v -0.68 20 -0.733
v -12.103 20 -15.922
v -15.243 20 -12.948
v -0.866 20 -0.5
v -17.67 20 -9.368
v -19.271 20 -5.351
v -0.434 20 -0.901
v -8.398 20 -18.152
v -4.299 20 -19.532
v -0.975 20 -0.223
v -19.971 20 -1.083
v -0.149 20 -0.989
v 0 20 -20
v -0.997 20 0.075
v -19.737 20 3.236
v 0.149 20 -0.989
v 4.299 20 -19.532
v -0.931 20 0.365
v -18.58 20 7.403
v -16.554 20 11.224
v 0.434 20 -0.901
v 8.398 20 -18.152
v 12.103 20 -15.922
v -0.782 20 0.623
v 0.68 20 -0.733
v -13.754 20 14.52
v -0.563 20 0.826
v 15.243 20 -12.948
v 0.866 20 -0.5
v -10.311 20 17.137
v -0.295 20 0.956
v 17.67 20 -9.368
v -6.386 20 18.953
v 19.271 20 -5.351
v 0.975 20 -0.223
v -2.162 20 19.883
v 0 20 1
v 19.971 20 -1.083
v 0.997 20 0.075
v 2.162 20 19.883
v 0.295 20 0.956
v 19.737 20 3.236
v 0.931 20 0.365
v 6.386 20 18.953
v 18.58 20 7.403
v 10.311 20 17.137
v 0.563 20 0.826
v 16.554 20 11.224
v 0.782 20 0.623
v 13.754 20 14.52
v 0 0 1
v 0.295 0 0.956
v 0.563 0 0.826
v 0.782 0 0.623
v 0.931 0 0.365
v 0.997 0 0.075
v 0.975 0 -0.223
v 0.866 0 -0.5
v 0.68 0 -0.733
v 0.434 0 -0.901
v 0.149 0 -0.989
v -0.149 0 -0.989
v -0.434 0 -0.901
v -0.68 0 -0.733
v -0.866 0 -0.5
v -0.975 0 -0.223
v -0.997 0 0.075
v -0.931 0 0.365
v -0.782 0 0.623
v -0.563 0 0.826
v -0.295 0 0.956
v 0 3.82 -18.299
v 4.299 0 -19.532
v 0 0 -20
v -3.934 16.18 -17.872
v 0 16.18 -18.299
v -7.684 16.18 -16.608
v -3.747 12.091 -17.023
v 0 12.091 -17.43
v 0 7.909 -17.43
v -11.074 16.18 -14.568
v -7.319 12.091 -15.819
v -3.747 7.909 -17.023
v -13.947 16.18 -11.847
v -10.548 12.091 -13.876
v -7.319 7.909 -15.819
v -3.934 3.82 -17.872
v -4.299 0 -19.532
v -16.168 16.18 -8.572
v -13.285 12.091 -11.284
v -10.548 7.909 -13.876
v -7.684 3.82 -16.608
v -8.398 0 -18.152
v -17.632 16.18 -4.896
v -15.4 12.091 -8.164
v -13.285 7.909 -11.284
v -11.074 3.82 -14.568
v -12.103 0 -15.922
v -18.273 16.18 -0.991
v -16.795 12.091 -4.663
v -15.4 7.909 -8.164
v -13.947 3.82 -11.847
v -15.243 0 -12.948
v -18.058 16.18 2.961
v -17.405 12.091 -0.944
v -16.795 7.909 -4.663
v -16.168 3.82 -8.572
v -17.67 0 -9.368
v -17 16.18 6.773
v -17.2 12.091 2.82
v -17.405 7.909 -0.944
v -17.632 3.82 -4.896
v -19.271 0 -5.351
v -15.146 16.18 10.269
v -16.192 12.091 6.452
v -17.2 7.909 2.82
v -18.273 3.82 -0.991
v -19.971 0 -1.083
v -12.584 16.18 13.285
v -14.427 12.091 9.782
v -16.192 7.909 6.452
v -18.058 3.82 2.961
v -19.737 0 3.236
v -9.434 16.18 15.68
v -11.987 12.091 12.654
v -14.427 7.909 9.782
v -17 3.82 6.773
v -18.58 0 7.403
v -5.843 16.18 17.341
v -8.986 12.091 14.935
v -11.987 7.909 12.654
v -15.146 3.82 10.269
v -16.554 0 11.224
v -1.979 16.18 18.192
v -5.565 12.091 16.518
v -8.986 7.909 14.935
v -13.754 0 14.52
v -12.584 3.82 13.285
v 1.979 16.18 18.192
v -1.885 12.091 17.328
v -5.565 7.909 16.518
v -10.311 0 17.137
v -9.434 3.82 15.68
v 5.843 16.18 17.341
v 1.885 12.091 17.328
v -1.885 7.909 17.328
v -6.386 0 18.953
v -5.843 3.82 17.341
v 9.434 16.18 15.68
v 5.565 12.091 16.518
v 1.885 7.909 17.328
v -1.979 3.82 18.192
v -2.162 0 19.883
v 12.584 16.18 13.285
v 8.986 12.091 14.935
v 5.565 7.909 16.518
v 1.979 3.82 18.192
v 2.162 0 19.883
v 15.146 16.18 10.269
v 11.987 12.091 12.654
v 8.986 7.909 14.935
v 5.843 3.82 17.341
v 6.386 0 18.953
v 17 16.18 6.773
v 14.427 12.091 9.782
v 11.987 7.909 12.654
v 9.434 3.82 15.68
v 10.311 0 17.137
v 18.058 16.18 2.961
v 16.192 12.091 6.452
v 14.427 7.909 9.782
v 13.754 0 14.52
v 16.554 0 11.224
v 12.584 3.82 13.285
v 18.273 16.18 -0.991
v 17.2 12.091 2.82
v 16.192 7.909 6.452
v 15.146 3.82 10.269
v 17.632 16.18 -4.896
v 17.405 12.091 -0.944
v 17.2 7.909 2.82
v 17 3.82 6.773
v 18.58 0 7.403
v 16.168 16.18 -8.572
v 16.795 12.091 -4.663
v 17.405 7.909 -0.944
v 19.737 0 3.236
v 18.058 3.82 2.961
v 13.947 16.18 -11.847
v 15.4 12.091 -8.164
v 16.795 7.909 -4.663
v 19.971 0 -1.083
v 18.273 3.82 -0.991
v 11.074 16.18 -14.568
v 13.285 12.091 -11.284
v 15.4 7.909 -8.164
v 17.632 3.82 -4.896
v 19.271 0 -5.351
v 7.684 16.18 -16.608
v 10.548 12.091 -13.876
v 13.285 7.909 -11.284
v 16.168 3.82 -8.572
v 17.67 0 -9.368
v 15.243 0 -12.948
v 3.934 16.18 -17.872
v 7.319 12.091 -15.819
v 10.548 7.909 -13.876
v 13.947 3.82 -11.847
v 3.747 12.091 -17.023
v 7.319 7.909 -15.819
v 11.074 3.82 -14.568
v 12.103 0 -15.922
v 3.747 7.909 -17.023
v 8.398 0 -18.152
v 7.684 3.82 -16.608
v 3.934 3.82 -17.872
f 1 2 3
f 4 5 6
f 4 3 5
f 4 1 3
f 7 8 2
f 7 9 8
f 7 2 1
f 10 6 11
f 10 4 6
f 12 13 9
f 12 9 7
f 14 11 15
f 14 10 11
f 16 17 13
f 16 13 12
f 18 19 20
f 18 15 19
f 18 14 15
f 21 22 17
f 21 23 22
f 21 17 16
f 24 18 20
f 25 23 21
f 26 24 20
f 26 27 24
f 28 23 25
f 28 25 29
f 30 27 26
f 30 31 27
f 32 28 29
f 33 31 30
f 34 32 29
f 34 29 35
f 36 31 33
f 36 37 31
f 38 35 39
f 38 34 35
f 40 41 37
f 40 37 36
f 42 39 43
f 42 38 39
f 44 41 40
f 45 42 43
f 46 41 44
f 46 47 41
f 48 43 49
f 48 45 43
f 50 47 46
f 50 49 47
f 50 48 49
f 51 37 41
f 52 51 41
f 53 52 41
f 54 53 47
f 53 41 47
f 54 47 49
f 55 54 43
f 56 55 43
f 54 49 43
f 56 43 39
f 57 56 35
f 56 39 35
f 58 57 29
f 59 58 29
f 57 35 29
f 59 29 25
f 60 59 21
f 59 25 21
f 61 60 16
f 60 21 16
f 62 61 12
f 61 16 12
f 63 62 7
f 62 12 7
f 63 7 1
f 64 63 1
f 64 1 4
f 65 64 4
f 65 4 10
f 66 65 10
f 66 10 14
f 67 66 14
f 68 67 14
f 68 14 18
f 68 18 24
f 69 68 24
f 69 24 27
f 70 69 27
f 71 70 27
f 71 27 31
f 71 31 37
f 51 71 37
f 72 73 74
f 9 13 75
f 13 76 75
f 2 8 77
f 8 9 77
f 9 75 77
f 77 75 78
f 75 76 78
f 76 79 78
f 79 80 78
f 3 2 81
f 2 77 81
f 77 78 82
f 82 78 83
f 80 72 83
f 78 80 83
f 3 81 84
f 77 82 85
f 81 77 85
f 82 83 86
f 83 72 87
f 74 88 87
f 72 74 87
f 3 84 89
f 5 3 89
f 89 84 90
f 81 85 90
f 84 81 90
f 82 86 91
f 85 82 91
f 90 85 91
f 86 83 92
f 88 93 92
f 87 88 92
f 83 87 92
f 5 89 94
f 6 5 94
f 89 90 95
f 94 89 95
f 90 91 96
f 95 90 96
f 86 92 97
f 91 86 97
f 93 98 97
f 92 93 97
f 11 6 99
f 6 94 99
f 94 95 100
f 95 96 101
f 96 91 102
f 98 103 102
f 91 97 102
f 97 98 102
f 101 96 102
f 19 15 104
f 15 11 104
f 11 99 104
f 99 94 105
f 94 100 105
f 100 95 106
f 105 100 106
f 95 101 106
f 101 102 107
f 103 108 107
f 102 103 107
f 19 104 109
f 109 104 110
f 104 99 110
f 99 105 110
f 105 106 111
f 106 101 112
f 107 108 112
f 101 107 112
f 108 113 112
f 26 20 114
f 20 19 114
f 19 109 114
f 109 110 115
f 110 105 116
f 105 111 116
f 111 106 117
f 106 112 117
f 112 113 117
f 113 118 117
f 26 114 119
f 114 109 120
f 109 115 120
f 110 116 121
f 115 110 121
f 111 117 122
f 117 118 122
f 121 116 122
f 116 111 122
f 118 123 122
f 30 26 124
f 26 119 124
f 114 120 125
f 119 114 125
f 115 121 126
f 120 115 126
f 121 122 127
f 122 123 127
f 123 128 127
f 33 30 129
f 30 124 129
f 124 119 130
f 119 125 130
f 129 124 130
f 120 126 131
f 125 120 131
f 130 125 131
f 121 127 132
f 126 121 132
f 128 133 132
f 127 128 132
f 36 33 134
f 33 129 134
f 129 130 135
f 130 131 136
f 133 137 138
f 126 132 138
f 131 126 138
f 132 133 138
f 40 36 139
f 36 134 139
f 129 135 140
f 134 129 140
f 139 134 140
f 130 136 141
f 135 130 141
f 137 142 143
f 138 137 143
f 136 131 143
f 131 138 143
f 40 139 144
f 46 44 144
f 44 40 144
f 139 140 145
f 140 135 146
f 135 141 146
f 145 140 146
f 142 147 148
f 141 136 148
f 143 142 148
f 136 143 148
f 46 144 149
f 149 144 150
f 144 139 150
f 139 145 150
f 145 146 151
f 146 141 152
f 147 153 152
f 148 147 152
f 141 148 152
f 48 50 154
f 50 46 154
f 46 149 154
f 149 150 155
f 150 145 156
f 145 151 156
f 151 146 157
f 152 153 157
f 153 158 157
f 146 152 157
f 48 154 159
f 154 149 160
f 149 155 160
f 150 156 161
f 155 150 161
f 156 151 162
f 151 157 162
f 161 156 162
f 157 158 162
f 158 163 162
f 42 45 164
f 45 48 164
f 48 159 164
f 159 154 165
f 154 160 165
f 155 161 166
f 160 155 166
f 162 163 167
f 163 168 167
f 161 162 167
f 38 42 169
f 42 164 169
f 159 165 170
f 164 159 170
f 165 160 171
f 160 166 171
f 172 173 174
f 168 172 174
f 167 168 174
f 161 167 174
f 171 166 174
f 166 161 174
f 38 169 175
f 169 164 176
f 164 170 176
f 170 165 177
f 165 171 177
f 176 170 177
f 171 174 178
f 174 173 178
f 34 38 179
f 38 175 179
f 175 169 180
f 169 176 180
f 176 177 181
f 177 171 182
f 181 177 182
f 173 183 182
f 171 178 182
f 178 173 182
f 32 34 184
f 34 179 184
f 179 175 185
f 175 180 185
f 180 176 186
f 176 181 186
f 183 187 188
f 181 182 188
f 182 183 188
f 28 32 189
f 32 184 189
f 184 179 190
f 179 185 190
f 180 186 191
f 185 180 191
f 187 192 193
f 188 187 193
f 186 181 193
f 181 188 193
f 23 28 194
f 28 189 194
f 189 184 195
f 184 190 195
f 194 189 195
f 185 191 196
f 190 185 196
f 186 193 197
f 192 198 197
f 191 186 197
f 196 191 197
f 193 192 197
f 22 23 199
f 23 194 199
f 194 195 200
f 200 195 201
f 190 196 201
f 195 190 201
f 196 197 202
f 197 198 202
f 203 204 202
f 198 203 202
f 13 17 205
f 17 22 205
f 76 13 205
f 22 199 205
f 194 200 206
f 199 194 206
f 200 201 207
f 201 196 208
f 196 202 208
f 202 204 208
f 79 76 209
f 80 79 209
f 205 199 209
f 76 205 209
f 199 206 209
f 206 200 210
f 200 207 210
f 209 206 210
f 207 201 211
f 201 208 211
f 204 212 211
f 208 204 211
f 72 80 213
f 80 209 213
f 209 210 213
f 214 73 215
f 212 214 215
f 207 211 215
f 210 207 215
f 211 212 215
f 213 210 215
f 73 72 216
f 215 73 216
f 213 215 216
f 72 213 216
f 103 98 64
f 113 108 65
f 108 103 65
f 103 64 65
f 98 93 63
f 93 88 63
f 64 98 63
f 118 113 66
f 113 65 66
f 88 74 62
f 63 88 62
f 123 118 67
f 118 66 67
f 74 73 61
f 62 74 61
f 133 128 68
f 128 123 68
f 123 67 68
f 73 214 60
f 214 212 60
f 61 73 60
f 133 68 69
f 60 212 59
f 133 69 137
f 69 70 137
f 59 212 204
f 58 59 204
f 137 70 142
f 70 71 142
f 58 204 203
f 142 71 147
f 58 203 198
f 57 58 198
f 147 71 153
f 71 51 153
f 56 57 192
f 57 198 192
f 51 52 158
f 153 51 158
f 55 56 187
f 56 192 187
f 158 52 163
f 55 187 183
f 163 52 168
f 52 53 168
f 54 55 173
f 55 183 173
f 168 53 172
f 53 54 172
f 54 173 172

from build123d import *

# Parameters (mm, degrees)
SKETCH1_R           = 20
BOSS_EXTRUDE1_DEPTH = 20
SKETCH2_R           = 20
SKETCH3_R           = 1
CUT_EXTRUDE1_DEPTH  = 35.641016151


with BuildPart() as part:
    # Sketch1 → Boss-Extrude1 (new body)
    with BuildSketch(Plane(origin=(0, 0, 0), x_dir=(1, 0, 0), z_dir=(0, 1, 0))):
        with Locations(Location((0, 0, 0), (0, 0, 270))):
            Circle(SKETCH1_R)
    extrude(amount=BOSS_EXTRUDE1_DEPTH)

    # Sketch2 → Cut-Revolve1 (revolve, cut)
    with BuildSketch(Plane(origin=(0, 0, 0), x_dir=(0, 0, -1), z_dir=(1, 0, 0))):
        with Locations((37.320508076, 10)):
            Circle(SKETCH2_R)
    revolve(axis=Axis((0, 0, 0), (0, 1, 0)), mode=Mode.SUBTRACT)

    # Sketch3 → Cut-Extrude1 (cut, through all)
    with BuildSketch(Plane(origin=(0, 20, 0), x_dir=(1, 0, 0), z_dir=(0, 1, 0))):
        with Locations(Location((0, 0, 0), (0, 0, 270))):
            Circle(SKETCH3_R)
    extrude(amount=-CUT_EXTRUDE1_DEPTH, mode=Mode.SUBTRACT)


solid = part.part
